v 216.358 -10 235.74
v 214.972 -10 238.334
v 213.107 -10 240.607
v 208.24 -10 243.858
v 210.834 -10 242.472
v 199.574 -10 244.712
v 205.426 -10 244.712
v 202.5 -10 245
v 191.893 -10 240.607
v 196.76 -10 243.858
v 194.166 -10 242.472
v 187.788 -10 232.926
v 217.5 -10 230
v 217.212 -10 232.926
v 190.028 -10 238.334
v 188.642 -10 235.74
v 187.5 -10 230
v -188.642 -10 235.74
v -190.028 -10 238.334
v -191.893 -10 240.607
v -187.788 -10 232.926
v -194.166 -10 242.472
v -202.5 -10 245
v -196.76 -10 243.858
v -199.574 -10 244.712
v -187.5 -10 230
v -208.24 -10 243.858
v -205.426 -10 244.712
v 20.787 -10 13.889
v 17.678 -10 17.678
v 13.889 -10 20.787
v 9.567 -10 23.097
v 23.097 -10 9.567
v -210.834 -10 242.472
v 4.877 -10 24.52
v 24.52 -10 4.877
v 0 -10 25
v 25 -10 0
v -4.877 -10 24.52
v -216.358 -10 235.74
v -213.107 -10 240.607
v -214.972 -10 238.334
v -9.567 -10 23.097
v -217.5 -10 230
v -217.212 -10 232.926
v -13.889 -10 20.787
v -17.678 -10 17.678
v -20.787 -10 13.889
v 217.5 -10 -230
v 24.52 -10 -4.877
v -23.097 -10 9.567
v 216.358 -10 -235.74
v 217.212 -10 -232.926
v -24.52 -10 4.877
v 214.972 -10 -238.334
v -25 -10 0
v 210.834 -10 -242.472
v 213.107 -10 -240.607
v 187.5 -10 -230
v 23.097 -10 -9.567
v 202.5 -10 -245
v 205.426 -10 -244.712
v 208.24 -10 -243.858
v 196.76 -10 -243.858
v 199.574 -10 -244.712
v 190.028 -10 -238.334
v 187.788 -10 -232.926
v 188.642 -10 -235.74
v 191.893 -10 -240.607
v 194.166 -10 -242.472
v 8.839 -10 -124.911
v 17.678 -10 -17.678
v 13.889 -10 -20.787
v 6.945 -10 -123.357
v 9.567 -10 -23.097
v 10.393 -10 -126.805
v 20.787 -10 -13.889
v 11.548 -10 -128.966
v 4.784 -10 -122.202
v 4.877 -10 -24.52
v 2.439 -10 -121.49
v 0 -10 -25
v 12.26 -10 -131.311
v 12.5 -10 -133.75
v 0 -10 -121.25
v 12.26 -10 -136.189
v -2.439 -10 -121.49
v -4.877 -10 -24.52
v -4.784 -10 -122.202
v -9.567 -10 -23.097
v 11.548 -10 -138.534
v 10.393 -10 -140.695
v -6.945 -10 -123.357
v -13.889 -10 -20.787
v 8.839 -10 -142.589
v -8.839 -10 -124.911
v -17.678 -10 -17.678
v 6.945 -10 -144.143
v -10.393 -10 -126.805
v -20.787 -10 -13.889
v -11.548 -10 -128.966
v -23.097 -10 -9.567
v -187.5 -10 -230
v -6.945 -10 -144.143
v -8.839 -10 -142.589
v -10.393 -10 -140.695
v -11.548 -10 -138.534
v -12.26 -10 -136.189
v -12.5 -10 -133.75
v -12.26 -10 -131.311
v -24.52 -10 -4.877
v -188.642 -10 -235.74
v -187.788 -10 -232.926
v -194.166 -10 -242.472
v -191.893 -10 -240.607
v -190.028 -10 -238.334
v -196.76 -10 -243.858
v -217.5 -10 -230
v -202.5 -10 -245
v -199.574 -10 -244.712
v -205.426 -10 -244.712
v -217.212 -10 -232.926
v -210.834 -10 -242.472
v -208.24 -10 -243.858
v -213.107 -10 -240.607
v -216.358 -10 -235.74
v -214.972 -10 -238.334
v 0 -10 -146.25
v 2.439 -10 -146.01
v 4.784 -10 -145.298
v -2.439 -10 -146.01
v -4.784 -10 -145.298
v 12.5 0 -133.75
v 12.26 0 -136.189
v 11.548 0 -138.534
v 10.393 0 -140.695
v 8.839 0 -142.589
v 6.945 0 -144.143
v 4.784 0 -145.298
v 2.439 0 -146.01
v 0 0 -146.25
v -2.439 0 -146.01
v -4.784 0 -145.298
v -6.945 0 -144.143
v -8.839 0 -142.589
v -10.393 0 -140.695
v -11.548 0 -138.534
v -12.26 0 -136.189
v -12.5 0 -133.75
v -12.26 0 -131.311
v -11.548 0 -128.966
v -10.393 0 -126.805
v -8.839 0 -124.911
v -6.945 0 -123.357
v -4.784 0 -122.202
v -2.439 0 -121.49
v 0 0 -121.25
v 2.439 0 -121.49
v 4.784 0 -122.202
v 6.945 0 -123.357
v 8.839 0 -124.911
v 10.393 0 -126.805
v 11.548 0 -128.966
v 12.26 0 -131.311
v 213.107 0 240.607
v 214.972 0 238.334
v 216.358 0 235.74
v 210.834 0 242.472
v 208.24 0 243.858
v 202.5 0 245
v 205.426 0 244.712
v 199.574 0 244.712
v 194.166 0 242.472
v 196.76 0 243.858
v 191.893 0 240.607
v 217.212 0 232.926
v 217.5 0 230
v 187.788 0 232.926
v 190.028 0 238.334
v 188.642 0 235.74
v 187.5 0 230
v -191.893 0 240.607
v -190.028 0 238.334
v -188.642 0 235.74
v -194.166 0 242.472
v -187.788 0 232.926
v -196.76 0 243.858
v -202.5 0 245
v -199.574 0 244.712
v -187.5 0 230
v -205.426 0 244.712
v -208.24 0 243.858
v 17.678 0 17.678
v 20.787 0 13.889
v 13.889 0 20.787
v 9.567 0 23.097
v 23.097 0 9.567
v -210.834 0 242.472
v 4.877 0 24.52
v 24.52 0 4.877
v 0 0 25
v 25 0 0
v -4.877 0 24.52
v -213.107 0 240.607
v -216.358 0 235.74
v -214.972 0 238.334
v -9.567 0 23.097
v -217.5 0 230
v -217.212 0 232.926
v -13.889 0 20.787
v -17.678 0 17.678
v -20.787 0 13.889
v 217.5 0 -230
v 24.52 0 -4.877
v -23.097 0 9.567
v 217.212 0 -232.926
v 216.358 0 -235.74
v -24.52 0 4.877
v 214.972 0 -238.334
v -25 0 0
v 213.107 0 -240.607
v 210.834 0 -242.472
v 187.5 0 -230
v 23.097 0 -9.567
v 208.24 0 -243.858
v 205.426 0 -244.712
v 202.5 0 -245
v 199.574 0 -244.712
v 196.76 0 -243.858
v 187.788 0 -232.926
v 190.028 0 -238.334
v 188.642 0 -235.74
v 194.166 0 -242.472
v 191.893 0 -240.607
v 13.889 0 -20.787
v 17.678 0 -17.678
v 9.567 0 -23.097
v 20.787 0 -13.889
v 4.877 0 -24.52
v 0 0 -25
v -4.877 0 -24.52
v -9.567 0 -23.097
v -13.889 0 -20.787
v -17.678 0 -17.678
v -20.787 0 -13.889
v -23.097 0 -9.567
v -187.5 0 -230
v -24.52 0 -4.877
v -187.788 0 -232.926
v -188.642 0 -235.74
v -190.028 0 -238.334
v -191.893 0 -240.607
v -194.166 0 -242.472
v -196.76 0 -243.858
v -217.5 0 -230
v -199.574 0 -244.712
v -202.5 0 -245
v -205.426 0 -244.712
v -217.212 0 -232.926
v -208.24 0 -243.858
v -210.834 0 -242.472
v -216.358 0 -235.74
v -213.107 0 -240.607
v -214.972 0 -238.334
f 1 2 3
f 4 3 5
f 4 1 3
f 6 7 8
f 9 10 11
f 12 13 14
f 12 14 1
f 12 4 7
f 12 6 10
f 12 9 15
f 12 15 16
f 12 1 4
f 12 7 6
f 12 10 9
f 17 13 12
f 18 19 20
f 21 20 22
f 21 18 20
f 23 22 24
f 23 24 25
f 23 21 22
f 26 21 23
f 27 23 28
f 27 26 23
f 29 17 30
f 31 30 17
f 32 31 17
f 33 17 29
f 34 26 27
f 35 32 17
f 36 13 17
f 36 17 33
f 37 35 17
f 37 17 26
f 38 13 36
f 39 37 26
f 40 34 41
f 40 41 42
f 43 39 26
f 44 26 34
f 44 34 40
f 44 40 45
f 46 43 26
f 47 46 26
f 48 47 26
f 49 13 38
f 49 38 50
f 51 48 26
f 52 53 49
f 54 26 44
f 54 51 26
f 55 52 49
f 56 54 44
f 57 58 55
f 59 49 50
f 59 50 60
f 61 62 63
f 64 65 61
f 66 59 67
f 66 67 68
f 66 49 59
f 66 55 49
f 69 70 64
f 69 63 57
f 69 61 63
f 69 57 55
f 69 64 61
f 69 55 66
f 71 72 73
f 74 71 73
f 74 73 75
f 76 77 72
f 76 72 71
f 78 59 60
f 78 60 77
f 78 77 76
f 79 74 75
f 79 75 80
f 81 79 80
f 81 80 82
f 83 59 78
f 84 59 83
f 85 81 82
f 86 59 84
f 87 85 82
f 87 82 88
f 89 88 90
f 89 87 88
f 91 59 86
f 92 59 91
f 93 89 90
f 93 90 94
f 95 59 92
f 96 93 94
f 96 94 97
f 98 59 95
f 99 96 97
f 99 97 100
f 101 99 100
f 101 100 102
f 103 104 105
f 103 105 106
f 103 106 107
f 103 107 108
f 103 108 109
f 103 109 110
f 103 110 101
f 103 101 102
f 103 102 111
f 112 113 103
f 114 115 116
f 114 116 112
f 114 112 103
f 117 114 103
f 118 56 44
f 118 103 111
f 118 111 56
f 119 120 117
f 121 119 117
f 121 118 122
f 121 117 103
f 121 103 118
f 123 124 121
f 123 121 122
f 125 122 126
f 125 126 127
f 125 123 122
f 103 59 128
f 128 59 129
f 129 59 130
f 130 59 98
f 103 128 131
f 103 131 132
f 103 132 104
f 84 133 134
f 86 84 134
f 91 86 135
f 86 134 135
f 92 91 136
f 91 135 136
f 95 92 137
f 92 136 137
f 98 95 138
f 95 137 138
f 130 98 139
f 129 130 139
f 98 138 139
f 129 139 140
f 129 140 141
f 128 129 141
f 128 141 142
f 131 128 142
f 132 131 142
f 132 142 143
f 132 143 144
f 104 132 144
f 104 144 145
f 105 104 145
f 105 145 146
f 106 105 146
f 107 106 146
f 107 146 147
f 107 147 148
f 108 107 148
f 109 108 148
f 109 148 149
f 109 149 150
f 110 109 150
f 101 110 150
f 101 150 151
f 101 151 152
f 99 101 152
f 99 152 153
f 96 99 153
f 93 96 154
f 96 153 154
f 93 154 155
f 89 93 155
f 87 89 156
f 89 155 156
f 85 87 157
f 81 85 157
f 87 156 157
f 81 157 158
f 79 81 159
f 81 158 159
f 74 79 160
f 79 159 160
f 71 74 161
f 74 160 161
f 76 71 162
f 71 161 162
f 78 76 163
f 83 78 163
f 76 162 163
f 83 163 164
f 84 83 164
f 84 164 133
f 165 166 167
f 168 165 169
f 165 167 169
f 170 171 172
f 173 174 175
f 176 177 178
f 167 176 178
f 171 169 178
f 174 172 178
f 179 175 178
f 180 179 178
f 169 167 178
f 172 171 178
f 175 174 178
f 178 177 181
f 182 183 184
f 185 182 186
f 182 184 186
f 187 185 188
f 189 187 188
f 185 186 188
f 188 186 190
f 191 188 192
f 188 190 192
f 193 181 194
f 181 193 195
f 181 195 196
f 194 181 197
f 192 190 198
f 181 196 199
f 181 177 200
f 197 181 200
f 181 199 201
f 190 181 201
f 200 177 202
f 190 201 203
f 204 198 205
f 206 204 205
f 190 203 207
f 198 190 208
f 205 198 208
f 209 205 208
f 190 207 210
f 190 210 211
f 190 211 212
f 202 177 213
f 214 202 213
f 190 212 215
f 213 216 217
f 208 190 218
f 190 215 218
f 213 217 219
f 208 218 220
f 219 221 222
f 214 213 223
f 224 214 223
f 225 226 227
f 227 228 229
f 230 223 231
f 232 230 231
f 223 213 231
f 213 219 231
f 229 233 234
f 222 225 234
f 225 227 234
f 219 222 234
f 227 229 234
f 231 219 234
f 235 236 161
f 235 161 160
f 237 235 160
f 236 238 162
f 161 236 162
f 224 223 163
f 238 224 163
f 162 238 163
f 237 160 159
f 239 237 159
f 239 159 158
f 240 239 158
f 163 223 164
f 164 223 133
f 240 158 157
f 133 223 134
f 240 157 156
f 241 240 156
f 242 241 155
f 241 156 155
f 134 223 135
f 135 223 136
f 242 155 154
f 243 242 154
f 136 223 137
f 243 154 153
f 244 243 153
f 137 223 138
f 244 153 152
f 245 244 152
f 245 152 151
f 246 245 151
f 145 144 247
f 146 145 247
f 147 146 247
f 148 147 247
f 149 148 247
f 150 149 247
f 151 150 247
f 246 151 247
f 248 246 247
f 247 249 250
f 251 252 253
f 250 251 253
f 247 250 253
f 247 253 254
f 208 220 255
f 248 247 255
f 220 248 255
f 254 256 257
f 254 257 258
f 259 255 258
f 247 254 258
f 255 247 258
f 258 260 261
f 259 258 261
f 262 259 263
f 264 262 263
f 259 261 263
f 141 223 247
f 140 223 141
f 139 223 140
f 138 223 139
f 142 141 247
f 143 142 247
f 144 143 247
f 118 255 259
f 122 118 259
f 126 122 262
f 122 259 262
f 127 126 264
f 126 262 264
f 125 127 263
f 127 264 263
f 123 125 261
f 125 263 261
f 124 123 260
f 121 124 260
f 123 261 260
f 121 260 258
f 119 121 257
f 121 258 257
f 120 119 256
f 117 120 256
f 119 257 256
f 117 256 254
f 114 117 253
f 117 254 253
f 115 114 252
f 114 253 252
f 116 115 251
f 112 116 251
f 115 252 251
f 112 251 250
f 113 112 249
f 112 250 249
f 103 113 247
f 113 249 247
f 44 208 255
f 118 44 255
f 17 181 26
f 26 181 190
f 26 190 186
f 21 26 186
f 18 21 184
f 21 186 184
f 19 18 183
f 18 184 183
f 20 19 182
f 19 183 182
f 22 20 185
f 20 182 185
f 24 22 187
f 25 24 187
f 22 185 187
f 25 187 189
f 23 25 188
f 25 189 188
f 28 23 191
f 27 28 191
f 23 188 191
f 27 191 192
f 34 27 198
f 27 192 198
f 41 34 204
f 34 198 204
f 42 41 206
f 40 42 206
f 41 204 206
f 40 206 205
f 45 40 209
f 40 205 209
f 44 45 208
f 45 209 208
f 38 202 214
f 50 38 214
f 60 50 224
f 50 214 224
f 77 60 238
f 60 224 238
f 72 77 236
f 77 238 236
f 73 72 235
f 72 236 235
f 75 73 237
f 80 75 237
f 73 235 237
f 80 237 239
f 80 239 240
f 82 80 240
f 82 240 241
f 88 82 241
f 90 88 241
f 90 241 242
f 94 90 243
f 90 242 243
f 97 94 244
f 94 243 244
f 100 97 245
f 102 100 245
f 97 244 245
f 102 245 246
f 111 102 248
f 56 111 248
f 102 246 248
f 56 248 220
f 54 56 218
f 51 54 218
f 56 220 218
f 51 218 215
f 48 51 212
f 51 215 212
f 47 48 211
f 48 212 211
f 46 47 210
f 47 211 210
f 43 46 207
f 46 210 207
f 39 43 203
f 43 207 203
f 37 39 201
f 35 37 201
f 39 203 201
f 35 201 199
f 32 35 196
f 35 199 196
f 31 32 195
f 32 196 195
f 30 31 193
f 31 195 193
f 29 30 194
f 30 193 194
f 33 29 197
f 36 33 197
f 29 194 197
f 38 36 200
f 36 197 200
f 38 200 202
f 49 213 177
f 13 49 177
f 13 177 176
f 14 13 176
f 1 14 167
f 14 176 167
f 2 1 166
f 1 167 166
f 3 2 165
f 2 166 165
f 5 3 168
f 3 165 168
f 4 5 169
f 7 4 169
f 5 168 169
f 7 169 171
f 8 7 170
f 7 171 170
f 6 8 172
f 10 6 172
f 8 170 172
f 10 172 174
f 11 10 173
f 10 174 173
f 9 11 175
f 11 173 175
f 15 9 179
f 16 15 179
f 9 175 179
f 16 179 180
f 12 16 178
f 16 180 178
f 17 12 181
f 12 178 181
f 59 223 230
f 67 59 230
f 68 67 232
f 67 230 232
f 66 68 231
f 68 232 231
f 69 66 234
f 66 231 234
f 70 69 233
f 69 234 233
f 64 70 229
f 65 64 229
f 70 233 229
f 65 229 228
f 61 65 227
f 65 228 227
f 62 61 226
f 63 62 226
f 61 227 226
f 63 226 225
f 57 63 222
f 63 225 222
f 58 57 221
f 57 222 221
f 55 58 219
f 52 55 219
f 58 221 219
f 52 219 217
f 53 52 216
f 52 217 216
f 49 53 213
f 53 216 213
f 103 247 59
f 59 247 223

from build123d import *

# Parameters (mm, degrees)
SKETCH1_R           = 25
BOSS_EXTRUDE2_DEPTH = 10
SKETCH3_R           = 12.5
CUT_EXTRUDE3_DEPTH  = 11


with BuildPart() as part:
    # Sketch1 → Boss-Extrude2 (new body)
    with BuildSketch(Plane(origin=(0, 0, 0), x_dir=(1, 0, 0), z_dir=(0, 1, 0))):
        with BuildLine():
            Line((-187.5, 230), (187.5, 230))
            ThreePointArc((187.5, 230), (202.5, 245), (217.5, 230))
            Line((217.5, 230), (217.5, -230))
            ThreePointArc((217.5, -230), (202.5, -245), (187.5, -230))
            Line((187.5, -230), (-187.5, -230))
            ThreePointArc((-187.5, -230), (-202.5, -245), (-217.5, -230))
            Line((-217.5, -230), (-217.5, 230))
            ThreePointArc((-217.5, 230), (-202.5, 245), (-187.5, 230))
        make_face()
        Circle(SKETCH1_R, mode=Mode.SUBTRACT)
    extrude(amount=-BOSS_EXTRUDE2_DEPTH)

    # Sketch3 → Cut-Extrude3 (cut, through all)
    with BuildSketch(Plane(origin=(0, 0, 0), x_dir=(1, 0, 0), z_dir=(0, 1, 0))):
        with Locations((0, 133.75)):
            Circle(SKETCH3_R)
    extrude(amount=-CUT_EXTRUDE3_DEPTH, mode=Mode.SUBTRACT)


solid = part.part
